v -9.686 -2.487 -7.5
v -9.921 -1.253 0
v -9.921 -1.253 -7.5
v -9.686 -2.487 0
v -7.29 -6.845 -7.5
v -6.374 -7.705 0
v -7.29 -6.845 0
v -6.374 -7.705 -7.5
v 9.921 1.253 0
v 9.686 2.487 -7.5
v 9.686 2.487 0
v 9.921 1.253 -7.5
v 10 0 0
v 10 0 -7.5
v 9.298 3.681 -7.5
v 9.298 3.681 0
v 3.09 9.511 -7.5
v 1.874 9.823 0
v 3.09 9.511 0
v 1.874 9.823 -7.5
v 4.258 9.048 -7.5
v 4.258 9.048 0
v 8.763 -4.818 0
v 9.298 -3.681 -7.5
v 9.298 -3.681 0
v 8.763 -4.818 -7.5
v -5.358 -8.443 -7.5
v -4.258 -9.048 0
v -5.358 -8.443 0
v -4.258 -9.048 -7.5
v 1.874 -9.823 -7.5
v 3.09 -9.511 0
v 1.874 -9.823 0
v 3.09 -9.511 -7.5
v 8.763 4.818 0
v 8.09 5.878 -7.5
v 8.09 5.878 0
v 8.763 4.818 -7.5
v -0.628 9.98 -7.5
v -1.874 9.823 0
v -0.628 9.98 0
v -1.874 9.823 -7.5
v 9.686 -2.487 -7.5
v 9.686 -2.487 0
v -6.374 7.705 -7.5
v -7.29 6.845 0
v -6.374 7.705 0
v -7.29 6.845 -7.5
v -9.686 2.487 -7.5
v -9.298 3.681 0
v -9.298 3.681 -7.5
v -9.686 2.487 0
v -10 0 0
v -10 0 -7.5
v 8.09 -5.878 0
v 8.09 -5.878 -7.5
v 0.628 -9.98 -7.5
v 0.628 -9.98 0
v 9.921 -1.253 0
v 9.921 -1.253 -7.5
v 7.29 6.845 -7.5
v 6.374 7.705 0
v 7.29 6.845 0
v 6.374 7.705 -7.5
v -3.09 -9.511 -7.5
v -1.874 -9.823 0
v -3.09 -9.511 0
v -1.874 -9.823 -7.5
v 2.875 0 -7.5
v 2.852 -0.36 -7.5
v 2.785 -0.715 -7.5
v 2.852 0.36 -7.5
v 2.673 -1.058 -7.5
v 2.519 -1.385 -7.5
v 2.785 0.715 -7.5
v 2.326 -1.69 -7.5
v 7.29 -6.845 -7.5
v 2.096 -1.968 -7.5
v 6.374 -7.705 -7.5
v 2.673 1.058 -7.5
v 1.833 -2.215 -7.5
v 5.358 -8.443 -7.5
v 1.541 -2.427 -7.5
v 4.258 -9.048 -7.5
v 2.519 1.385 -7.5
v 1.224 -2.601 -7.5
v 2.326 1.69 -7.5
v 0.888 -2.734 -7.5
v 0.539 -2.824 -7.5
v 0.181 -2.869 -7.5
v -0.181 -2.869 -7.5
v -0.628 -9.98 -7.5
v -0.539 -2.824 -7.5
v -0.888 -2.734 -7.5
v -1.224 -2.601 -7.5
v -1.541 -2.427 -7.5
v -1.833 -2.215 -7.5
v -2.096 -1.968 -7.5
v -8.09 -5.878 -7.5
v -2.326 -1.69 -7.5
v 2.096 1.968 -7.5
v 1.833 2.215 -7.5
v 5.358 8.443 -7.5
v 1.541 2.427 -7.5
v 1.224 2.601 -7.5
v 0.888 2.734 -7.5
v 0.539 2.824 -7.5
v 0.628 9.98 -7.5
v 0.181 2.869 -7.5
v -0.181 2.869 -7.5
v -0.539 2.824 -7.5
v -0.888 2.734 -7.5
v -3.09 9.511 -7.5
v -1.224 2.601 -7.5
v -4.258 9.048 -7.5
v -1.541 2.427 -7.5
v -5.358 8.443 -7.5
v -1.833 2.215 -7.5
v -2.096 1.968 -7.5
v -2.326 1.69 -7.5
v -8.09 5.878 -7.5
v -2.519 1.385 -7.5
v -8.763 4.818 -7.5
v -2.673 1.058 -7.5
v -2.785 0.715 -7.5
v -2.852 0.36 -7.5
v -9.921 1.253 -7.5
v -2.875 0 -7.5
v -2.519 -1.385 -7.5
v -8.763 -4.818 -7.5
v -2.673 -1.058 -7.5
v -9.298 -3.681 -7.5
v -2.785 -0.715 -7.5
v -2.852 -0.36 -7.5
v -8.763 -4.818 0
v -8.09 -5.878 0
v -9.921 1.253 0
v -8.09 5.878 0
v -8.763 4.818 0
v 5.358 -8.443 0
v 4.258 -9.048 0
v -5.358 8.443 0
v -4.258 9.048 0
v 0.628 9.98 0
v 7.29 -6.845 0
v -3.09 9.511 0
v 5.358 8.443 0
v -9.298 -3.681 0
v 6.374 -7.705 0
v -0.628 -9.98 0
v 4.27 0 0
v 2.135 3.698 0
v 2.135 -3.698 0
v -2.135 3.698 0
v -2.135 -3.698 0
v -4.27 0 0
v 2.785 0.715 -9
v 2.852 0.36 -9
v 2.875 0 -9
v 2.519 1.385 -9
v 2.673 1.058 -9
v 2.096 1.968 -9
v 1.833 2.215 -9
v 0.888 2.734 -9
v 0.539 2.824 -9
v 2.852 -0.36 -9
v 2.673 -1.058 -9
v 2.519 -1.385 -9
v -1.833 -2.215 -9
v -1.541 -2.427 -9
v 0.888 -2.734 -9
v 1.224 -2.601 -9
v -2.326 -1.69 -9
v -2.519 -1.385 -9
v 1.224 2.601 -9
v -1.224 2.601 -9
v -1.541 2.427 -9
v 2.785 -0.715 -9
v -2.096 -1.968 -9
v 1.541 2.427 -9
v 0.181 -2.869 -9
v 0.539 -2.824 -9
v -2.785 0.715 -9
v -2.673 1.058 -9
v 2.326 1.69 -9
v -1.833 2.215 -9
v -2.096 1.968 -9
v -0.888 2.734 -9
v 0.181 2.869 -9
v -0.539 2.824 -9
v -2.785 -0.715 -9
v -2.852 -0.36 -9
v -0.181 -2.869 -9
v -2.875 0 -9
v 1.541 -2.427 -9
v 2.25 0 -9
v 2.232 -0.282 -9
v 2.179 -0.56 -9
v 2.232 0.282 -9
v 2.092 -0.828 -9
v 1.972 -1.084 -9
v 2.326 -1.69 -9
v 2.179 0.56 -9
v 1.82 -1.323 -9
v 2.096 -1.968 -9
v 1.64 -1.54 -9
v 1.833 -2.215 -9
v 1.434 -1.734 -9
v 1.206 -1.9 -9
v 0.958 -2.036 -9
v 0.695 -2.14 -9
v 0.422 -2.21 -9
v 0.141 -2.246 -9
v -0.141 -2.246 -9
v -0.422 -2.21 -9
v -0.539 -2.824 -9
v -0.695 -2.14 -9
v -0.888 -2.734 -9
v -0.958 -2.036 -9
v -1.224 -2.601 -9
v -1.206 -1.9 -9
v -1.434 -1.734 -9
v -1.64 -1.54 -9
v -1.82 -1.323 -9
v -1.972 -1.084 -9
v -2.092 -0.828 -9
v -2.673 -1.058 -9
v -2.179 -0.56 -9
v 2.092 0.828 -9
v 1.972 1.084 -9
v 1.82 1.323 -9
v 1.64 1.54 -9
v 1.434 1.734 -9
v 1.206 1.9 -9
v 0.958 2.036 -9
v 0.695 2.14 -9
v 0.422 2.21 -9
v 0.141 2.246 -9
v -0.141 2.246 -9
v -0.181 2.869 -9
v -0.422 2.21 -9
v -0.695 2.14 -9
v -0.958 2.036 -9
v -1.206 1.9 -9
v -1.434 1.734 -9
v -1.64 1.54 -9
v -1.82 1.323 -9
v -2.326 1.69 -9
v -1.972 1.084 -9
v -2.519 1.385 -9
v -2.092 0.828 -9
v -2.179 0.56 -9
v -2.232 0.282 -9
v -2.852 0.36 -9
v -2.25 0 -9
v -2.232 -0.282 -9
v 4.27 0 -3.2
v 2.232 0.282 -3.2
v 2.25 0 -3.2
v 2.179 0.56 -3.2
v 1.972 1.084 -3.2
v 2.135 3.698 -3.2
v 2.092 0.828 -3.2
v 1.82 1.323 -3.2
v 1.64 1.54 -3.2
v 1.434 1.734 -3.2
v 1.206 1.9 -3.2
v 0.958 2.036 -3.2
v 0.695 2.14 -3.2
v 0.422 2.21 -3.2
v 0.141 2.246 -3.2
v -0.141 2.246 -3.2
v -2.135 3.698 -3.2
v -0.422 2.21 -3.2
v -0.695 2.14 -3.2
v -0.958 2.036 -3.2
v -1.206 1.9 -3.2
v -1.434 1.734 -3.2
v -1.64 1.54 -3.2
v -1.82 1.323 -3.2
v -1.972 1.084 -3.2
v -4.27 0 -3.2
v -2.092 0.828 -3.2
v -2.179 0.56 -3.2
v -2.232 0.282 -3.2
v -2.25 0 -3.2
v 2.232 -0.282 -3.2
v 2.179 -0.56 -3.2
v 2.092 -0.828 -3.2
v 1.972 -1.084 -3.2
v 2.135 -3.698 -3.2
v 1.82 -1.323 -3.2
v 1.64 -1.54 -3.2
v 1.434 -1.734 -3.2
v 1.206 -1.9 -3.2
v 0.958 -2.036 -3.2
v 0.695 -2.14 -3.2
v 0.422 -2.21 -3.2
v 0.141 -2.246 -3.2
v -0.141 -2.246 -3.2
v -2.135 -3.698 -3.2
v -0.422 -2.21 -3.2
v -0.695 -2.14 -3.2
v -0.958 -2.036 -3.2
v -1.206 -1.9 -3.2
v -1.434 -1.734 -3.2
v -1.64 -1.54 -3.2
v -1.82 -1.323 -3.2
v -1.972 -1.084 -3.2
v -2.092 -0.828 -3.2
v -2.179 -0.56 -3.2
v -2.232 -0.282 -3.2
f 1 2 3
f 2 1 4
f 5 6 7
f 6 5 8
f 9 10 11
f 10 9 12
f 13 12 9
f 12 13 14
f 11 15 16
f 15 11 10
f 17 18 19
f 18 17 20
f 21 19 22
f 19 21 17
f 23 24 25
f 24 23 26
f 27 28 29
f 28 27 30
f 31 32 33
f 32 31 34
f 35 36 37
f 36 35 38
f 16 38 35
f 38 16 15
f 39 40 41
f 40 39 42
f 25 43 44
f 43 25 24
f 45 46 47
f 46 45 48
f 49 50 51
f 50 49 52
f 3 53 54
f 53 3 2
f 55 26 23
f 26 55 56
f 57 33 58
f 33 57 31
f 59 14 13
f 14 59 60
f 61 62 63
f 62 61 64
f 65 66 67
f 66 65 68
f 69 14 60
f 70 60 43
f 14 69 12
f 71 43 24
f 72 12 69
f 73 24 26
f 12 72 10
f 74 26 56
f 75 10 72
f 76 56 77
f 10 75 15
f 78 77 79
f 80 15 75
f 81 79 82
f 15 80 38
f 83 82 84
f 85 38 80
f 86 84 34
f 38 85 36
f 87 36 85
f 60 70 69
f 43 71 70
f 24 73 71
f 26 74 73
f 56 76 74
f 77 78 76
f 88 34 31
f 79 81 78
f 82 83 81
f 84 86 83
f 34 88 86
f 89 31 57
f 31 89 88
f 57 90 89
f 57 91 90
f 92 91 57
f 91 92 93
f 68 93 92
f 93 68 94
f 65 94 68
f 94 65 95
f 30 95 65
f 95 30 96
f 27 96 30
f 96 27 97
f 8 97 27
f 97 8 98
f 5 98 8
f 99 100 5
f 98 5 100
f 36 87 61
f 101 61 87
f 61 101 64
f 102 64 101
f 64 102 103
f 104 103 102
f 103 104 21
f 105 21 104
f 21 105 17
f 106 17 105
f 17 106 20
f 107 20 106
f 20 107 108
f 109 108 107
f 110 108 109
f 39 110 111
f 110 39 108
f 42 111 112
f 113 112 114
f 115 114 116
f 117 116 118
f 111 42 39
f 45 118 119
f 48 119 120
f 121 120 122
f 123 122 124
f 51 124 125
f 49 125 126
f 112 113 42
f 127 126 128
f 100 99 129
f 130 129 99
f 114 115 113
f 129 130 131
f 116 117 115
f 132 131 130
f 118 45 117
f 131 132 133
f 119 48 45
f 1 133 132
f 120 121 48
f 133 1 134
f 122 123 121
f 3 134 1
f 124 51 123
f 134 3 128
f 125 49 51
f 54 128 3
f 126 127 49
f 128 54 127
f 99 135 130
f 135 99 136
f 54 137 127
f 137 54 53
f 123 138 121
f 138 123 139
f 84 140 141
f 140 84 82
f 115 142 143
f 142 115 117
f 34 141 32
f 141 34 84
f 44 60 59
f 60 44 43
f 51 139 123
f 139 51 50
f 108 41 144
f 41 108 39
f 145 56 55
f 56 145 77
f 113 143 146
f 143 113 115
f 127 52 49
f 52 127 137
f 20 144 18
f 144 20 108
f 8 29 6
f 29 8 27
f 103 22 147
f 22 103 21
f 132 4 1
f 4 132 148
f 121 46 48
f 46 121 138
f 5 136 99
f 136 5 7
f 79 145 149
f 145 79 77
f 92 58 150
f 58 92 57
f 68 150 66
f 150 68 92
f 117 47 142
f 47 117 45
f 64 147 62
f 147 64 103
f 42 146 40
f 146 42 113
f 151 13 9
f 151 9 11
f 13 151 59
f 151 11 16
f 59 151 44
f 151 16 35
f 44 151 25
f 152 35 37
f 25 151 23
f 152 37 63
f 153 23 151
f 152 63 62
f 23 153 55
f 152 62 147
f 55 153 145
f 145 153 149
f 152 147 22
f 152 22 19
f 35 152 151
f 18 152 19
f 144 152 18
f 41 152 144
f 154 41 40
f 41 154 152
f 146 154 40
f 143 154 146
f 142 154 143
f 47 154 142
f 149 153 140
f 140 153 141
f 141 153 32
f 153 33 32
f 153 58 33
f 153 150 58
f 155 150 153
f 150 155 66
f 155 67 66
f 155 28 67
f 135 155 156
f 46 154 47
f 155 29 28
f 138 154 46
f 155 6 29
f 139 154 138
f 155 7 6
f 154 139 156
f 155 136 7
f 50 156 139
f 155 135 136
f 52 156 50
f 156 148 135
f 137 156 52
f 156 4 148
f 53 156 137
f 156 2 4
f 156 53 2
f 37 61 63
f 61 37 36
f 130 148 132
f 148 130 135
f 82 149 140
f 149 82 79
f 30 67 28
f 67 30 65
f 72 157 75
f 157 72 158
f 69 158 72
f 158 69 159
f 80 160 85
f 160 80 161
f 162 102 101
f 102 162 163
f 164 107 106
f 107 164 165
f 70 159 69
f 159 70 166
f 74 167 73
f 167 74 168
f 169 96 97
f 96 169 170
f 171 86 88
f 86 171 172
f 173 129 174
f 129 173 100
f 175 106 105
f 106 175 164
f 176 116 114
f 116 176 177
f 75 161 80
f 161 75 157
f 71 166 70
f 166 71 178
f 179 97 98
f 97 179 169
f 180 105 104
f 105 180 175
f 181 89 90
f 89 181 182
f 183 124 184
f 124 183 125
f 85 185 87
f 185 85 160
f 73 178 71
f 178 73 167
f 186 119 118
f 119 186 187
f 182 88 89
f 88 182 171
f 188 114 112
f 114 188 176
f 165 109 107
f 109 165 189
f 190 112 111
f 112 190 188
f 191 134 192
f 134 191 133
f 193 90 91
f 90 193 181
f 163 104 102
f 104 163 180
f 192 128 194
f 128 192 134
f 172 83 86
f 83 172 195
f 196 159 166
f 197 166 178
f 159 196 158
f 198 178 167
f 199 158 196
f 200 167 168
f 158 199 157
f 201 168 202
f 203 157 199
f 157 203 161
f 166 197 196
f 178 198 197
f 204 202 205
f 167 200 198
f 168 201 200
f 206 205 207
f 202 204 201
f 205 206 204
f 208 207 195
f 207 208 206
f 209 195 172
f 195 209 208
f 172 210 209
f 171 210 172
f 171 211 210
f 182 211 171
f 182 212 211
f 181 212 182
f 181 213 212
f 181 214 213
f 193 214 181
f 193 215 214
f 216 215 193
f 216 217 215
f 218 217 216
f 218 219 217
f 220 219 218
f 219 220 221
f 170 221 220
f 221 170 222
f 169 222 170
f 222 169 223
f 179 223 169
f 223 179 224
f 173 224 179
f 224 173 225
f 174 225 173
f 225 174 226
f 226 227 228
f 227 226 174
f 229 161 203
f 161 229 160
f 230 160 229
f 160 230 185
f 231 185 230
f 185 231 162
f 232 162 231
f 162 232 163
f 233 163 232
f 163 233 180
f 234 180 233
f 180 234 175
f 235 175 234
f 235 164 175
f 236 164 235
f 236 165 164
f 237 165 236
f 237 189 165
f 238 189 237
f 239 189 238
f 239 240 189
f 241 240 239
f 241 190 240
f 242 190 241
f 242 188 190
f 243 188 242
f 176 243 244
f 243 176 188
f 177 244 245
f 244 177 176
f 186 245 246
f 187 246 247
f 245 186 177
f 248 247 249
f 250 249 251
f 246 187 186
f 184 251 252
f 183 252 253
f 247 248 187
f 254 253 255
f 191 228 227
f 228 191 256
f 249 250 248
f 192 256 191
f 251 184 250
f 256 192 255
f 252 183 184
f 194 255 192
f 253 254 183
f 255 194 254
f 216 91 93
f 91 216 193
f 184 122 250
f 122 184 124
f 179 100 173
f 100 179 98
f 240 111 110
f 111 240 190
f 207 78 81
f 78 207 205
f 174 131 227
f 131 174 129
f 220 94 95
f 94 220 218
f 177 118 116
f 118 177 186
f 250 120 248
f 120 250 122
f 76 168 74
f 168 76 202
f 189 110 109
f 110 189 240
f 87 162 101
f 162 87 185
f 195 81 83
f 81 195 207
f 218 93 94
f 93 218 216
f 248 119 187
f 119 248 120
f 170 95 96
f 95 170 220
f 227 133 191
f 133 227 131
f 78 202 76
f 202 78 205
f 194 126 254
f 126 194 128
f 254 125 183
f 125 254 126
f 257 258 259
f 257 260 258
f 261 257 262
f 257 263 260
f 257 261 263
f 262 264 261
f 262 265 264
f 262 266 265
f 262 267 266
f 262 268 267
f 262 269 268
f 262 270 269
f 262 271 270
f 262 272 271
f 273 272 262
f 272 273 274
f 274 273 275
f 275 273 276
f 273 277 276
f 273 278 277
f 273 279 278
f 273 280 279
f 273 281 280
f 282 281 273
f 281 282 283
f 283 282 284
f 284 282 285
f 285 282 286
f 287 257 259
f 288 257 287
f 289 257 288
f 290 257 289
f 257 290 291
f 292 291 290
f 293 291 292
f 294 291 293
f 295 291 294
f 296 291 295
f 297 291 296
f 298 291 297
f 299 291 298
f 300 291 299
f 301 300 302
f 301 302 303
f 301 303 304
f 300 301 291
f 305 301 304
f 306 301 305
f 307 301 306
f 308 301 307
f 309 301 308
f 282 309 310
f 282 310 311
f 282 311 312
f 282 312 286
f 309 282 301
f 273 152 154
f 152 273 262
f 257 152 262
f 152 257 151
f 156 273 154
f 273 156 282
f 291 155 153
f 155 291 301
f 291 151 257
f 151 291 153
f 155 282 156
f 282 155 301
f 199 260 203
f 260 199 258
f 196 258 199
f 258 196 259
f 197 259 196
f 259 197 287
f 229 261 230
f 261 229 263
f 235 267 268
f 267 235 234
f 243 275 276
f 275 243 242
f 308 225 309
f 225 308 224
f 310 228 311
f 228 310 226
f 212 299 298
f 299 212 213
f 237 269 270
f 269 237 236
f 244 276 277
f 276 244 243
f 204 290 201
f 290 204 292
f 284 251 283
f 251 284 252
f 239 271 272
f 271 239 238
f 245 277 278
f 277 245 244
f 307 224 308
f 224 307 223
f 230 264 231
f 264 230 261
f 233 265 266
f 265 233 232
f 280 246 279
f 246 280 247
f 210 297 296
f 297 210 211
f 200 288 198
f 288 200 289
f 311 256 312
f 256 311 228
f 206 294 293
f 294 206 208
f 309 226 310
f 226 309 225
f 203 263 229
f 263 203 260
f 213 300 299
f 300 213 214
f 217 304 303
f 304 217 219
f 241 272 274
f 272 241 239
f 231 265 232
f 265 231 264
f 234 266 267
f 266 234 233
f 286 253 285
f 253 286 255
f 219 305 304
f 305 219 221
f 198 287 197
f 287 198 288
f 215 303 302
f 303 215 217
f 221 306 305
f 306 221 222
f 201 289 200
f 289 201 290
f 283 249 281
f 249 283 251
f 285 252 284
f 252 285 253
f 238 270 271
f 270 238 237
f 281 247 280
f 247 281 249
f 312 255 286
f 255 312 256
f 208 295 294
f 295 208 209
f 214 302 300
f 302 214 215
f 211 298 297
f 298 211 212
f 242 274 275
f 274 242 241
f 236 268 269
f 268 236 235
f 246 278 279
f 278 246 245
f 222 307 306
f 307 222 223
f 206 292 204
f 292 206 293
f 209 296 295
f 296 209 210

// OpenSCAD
$fn = 50;

difference() {
	union() {
		translate(v = [0, 0, -7.5]) {
			cylinder(h = 7.5, r = 10.0);
		}
		#translate(v = [0, 0, -9.0]) {
			cylinder(h = 9, r = 2.875);
		}
	}
	union() {
		translate(v = [0, 0, 0]) {
			rotate(a = [0, 0, 0]) {
				difference() {
					union() {
						translate(v = [0, 0, -3.2]) {
							linear_extrude(height = 3.2) {
								polygon(points = [[4.2698, 0.0], [2.1349000000000005, 3.697755269078796], [-2.134899999999999, 3.6977552690787965], [-4.2698, 5.228996902999369e-16], [-2.134900000000002, -3.6977552690787956], [2.1348999999999974, -3.697755269078798]]);
							}
						}
					}
					union();
				}
			}
		}
		#translate(v = [0, 0, -100.0]) {
			cylinder(h = 200, r = 2.25);
		}
	}
}
